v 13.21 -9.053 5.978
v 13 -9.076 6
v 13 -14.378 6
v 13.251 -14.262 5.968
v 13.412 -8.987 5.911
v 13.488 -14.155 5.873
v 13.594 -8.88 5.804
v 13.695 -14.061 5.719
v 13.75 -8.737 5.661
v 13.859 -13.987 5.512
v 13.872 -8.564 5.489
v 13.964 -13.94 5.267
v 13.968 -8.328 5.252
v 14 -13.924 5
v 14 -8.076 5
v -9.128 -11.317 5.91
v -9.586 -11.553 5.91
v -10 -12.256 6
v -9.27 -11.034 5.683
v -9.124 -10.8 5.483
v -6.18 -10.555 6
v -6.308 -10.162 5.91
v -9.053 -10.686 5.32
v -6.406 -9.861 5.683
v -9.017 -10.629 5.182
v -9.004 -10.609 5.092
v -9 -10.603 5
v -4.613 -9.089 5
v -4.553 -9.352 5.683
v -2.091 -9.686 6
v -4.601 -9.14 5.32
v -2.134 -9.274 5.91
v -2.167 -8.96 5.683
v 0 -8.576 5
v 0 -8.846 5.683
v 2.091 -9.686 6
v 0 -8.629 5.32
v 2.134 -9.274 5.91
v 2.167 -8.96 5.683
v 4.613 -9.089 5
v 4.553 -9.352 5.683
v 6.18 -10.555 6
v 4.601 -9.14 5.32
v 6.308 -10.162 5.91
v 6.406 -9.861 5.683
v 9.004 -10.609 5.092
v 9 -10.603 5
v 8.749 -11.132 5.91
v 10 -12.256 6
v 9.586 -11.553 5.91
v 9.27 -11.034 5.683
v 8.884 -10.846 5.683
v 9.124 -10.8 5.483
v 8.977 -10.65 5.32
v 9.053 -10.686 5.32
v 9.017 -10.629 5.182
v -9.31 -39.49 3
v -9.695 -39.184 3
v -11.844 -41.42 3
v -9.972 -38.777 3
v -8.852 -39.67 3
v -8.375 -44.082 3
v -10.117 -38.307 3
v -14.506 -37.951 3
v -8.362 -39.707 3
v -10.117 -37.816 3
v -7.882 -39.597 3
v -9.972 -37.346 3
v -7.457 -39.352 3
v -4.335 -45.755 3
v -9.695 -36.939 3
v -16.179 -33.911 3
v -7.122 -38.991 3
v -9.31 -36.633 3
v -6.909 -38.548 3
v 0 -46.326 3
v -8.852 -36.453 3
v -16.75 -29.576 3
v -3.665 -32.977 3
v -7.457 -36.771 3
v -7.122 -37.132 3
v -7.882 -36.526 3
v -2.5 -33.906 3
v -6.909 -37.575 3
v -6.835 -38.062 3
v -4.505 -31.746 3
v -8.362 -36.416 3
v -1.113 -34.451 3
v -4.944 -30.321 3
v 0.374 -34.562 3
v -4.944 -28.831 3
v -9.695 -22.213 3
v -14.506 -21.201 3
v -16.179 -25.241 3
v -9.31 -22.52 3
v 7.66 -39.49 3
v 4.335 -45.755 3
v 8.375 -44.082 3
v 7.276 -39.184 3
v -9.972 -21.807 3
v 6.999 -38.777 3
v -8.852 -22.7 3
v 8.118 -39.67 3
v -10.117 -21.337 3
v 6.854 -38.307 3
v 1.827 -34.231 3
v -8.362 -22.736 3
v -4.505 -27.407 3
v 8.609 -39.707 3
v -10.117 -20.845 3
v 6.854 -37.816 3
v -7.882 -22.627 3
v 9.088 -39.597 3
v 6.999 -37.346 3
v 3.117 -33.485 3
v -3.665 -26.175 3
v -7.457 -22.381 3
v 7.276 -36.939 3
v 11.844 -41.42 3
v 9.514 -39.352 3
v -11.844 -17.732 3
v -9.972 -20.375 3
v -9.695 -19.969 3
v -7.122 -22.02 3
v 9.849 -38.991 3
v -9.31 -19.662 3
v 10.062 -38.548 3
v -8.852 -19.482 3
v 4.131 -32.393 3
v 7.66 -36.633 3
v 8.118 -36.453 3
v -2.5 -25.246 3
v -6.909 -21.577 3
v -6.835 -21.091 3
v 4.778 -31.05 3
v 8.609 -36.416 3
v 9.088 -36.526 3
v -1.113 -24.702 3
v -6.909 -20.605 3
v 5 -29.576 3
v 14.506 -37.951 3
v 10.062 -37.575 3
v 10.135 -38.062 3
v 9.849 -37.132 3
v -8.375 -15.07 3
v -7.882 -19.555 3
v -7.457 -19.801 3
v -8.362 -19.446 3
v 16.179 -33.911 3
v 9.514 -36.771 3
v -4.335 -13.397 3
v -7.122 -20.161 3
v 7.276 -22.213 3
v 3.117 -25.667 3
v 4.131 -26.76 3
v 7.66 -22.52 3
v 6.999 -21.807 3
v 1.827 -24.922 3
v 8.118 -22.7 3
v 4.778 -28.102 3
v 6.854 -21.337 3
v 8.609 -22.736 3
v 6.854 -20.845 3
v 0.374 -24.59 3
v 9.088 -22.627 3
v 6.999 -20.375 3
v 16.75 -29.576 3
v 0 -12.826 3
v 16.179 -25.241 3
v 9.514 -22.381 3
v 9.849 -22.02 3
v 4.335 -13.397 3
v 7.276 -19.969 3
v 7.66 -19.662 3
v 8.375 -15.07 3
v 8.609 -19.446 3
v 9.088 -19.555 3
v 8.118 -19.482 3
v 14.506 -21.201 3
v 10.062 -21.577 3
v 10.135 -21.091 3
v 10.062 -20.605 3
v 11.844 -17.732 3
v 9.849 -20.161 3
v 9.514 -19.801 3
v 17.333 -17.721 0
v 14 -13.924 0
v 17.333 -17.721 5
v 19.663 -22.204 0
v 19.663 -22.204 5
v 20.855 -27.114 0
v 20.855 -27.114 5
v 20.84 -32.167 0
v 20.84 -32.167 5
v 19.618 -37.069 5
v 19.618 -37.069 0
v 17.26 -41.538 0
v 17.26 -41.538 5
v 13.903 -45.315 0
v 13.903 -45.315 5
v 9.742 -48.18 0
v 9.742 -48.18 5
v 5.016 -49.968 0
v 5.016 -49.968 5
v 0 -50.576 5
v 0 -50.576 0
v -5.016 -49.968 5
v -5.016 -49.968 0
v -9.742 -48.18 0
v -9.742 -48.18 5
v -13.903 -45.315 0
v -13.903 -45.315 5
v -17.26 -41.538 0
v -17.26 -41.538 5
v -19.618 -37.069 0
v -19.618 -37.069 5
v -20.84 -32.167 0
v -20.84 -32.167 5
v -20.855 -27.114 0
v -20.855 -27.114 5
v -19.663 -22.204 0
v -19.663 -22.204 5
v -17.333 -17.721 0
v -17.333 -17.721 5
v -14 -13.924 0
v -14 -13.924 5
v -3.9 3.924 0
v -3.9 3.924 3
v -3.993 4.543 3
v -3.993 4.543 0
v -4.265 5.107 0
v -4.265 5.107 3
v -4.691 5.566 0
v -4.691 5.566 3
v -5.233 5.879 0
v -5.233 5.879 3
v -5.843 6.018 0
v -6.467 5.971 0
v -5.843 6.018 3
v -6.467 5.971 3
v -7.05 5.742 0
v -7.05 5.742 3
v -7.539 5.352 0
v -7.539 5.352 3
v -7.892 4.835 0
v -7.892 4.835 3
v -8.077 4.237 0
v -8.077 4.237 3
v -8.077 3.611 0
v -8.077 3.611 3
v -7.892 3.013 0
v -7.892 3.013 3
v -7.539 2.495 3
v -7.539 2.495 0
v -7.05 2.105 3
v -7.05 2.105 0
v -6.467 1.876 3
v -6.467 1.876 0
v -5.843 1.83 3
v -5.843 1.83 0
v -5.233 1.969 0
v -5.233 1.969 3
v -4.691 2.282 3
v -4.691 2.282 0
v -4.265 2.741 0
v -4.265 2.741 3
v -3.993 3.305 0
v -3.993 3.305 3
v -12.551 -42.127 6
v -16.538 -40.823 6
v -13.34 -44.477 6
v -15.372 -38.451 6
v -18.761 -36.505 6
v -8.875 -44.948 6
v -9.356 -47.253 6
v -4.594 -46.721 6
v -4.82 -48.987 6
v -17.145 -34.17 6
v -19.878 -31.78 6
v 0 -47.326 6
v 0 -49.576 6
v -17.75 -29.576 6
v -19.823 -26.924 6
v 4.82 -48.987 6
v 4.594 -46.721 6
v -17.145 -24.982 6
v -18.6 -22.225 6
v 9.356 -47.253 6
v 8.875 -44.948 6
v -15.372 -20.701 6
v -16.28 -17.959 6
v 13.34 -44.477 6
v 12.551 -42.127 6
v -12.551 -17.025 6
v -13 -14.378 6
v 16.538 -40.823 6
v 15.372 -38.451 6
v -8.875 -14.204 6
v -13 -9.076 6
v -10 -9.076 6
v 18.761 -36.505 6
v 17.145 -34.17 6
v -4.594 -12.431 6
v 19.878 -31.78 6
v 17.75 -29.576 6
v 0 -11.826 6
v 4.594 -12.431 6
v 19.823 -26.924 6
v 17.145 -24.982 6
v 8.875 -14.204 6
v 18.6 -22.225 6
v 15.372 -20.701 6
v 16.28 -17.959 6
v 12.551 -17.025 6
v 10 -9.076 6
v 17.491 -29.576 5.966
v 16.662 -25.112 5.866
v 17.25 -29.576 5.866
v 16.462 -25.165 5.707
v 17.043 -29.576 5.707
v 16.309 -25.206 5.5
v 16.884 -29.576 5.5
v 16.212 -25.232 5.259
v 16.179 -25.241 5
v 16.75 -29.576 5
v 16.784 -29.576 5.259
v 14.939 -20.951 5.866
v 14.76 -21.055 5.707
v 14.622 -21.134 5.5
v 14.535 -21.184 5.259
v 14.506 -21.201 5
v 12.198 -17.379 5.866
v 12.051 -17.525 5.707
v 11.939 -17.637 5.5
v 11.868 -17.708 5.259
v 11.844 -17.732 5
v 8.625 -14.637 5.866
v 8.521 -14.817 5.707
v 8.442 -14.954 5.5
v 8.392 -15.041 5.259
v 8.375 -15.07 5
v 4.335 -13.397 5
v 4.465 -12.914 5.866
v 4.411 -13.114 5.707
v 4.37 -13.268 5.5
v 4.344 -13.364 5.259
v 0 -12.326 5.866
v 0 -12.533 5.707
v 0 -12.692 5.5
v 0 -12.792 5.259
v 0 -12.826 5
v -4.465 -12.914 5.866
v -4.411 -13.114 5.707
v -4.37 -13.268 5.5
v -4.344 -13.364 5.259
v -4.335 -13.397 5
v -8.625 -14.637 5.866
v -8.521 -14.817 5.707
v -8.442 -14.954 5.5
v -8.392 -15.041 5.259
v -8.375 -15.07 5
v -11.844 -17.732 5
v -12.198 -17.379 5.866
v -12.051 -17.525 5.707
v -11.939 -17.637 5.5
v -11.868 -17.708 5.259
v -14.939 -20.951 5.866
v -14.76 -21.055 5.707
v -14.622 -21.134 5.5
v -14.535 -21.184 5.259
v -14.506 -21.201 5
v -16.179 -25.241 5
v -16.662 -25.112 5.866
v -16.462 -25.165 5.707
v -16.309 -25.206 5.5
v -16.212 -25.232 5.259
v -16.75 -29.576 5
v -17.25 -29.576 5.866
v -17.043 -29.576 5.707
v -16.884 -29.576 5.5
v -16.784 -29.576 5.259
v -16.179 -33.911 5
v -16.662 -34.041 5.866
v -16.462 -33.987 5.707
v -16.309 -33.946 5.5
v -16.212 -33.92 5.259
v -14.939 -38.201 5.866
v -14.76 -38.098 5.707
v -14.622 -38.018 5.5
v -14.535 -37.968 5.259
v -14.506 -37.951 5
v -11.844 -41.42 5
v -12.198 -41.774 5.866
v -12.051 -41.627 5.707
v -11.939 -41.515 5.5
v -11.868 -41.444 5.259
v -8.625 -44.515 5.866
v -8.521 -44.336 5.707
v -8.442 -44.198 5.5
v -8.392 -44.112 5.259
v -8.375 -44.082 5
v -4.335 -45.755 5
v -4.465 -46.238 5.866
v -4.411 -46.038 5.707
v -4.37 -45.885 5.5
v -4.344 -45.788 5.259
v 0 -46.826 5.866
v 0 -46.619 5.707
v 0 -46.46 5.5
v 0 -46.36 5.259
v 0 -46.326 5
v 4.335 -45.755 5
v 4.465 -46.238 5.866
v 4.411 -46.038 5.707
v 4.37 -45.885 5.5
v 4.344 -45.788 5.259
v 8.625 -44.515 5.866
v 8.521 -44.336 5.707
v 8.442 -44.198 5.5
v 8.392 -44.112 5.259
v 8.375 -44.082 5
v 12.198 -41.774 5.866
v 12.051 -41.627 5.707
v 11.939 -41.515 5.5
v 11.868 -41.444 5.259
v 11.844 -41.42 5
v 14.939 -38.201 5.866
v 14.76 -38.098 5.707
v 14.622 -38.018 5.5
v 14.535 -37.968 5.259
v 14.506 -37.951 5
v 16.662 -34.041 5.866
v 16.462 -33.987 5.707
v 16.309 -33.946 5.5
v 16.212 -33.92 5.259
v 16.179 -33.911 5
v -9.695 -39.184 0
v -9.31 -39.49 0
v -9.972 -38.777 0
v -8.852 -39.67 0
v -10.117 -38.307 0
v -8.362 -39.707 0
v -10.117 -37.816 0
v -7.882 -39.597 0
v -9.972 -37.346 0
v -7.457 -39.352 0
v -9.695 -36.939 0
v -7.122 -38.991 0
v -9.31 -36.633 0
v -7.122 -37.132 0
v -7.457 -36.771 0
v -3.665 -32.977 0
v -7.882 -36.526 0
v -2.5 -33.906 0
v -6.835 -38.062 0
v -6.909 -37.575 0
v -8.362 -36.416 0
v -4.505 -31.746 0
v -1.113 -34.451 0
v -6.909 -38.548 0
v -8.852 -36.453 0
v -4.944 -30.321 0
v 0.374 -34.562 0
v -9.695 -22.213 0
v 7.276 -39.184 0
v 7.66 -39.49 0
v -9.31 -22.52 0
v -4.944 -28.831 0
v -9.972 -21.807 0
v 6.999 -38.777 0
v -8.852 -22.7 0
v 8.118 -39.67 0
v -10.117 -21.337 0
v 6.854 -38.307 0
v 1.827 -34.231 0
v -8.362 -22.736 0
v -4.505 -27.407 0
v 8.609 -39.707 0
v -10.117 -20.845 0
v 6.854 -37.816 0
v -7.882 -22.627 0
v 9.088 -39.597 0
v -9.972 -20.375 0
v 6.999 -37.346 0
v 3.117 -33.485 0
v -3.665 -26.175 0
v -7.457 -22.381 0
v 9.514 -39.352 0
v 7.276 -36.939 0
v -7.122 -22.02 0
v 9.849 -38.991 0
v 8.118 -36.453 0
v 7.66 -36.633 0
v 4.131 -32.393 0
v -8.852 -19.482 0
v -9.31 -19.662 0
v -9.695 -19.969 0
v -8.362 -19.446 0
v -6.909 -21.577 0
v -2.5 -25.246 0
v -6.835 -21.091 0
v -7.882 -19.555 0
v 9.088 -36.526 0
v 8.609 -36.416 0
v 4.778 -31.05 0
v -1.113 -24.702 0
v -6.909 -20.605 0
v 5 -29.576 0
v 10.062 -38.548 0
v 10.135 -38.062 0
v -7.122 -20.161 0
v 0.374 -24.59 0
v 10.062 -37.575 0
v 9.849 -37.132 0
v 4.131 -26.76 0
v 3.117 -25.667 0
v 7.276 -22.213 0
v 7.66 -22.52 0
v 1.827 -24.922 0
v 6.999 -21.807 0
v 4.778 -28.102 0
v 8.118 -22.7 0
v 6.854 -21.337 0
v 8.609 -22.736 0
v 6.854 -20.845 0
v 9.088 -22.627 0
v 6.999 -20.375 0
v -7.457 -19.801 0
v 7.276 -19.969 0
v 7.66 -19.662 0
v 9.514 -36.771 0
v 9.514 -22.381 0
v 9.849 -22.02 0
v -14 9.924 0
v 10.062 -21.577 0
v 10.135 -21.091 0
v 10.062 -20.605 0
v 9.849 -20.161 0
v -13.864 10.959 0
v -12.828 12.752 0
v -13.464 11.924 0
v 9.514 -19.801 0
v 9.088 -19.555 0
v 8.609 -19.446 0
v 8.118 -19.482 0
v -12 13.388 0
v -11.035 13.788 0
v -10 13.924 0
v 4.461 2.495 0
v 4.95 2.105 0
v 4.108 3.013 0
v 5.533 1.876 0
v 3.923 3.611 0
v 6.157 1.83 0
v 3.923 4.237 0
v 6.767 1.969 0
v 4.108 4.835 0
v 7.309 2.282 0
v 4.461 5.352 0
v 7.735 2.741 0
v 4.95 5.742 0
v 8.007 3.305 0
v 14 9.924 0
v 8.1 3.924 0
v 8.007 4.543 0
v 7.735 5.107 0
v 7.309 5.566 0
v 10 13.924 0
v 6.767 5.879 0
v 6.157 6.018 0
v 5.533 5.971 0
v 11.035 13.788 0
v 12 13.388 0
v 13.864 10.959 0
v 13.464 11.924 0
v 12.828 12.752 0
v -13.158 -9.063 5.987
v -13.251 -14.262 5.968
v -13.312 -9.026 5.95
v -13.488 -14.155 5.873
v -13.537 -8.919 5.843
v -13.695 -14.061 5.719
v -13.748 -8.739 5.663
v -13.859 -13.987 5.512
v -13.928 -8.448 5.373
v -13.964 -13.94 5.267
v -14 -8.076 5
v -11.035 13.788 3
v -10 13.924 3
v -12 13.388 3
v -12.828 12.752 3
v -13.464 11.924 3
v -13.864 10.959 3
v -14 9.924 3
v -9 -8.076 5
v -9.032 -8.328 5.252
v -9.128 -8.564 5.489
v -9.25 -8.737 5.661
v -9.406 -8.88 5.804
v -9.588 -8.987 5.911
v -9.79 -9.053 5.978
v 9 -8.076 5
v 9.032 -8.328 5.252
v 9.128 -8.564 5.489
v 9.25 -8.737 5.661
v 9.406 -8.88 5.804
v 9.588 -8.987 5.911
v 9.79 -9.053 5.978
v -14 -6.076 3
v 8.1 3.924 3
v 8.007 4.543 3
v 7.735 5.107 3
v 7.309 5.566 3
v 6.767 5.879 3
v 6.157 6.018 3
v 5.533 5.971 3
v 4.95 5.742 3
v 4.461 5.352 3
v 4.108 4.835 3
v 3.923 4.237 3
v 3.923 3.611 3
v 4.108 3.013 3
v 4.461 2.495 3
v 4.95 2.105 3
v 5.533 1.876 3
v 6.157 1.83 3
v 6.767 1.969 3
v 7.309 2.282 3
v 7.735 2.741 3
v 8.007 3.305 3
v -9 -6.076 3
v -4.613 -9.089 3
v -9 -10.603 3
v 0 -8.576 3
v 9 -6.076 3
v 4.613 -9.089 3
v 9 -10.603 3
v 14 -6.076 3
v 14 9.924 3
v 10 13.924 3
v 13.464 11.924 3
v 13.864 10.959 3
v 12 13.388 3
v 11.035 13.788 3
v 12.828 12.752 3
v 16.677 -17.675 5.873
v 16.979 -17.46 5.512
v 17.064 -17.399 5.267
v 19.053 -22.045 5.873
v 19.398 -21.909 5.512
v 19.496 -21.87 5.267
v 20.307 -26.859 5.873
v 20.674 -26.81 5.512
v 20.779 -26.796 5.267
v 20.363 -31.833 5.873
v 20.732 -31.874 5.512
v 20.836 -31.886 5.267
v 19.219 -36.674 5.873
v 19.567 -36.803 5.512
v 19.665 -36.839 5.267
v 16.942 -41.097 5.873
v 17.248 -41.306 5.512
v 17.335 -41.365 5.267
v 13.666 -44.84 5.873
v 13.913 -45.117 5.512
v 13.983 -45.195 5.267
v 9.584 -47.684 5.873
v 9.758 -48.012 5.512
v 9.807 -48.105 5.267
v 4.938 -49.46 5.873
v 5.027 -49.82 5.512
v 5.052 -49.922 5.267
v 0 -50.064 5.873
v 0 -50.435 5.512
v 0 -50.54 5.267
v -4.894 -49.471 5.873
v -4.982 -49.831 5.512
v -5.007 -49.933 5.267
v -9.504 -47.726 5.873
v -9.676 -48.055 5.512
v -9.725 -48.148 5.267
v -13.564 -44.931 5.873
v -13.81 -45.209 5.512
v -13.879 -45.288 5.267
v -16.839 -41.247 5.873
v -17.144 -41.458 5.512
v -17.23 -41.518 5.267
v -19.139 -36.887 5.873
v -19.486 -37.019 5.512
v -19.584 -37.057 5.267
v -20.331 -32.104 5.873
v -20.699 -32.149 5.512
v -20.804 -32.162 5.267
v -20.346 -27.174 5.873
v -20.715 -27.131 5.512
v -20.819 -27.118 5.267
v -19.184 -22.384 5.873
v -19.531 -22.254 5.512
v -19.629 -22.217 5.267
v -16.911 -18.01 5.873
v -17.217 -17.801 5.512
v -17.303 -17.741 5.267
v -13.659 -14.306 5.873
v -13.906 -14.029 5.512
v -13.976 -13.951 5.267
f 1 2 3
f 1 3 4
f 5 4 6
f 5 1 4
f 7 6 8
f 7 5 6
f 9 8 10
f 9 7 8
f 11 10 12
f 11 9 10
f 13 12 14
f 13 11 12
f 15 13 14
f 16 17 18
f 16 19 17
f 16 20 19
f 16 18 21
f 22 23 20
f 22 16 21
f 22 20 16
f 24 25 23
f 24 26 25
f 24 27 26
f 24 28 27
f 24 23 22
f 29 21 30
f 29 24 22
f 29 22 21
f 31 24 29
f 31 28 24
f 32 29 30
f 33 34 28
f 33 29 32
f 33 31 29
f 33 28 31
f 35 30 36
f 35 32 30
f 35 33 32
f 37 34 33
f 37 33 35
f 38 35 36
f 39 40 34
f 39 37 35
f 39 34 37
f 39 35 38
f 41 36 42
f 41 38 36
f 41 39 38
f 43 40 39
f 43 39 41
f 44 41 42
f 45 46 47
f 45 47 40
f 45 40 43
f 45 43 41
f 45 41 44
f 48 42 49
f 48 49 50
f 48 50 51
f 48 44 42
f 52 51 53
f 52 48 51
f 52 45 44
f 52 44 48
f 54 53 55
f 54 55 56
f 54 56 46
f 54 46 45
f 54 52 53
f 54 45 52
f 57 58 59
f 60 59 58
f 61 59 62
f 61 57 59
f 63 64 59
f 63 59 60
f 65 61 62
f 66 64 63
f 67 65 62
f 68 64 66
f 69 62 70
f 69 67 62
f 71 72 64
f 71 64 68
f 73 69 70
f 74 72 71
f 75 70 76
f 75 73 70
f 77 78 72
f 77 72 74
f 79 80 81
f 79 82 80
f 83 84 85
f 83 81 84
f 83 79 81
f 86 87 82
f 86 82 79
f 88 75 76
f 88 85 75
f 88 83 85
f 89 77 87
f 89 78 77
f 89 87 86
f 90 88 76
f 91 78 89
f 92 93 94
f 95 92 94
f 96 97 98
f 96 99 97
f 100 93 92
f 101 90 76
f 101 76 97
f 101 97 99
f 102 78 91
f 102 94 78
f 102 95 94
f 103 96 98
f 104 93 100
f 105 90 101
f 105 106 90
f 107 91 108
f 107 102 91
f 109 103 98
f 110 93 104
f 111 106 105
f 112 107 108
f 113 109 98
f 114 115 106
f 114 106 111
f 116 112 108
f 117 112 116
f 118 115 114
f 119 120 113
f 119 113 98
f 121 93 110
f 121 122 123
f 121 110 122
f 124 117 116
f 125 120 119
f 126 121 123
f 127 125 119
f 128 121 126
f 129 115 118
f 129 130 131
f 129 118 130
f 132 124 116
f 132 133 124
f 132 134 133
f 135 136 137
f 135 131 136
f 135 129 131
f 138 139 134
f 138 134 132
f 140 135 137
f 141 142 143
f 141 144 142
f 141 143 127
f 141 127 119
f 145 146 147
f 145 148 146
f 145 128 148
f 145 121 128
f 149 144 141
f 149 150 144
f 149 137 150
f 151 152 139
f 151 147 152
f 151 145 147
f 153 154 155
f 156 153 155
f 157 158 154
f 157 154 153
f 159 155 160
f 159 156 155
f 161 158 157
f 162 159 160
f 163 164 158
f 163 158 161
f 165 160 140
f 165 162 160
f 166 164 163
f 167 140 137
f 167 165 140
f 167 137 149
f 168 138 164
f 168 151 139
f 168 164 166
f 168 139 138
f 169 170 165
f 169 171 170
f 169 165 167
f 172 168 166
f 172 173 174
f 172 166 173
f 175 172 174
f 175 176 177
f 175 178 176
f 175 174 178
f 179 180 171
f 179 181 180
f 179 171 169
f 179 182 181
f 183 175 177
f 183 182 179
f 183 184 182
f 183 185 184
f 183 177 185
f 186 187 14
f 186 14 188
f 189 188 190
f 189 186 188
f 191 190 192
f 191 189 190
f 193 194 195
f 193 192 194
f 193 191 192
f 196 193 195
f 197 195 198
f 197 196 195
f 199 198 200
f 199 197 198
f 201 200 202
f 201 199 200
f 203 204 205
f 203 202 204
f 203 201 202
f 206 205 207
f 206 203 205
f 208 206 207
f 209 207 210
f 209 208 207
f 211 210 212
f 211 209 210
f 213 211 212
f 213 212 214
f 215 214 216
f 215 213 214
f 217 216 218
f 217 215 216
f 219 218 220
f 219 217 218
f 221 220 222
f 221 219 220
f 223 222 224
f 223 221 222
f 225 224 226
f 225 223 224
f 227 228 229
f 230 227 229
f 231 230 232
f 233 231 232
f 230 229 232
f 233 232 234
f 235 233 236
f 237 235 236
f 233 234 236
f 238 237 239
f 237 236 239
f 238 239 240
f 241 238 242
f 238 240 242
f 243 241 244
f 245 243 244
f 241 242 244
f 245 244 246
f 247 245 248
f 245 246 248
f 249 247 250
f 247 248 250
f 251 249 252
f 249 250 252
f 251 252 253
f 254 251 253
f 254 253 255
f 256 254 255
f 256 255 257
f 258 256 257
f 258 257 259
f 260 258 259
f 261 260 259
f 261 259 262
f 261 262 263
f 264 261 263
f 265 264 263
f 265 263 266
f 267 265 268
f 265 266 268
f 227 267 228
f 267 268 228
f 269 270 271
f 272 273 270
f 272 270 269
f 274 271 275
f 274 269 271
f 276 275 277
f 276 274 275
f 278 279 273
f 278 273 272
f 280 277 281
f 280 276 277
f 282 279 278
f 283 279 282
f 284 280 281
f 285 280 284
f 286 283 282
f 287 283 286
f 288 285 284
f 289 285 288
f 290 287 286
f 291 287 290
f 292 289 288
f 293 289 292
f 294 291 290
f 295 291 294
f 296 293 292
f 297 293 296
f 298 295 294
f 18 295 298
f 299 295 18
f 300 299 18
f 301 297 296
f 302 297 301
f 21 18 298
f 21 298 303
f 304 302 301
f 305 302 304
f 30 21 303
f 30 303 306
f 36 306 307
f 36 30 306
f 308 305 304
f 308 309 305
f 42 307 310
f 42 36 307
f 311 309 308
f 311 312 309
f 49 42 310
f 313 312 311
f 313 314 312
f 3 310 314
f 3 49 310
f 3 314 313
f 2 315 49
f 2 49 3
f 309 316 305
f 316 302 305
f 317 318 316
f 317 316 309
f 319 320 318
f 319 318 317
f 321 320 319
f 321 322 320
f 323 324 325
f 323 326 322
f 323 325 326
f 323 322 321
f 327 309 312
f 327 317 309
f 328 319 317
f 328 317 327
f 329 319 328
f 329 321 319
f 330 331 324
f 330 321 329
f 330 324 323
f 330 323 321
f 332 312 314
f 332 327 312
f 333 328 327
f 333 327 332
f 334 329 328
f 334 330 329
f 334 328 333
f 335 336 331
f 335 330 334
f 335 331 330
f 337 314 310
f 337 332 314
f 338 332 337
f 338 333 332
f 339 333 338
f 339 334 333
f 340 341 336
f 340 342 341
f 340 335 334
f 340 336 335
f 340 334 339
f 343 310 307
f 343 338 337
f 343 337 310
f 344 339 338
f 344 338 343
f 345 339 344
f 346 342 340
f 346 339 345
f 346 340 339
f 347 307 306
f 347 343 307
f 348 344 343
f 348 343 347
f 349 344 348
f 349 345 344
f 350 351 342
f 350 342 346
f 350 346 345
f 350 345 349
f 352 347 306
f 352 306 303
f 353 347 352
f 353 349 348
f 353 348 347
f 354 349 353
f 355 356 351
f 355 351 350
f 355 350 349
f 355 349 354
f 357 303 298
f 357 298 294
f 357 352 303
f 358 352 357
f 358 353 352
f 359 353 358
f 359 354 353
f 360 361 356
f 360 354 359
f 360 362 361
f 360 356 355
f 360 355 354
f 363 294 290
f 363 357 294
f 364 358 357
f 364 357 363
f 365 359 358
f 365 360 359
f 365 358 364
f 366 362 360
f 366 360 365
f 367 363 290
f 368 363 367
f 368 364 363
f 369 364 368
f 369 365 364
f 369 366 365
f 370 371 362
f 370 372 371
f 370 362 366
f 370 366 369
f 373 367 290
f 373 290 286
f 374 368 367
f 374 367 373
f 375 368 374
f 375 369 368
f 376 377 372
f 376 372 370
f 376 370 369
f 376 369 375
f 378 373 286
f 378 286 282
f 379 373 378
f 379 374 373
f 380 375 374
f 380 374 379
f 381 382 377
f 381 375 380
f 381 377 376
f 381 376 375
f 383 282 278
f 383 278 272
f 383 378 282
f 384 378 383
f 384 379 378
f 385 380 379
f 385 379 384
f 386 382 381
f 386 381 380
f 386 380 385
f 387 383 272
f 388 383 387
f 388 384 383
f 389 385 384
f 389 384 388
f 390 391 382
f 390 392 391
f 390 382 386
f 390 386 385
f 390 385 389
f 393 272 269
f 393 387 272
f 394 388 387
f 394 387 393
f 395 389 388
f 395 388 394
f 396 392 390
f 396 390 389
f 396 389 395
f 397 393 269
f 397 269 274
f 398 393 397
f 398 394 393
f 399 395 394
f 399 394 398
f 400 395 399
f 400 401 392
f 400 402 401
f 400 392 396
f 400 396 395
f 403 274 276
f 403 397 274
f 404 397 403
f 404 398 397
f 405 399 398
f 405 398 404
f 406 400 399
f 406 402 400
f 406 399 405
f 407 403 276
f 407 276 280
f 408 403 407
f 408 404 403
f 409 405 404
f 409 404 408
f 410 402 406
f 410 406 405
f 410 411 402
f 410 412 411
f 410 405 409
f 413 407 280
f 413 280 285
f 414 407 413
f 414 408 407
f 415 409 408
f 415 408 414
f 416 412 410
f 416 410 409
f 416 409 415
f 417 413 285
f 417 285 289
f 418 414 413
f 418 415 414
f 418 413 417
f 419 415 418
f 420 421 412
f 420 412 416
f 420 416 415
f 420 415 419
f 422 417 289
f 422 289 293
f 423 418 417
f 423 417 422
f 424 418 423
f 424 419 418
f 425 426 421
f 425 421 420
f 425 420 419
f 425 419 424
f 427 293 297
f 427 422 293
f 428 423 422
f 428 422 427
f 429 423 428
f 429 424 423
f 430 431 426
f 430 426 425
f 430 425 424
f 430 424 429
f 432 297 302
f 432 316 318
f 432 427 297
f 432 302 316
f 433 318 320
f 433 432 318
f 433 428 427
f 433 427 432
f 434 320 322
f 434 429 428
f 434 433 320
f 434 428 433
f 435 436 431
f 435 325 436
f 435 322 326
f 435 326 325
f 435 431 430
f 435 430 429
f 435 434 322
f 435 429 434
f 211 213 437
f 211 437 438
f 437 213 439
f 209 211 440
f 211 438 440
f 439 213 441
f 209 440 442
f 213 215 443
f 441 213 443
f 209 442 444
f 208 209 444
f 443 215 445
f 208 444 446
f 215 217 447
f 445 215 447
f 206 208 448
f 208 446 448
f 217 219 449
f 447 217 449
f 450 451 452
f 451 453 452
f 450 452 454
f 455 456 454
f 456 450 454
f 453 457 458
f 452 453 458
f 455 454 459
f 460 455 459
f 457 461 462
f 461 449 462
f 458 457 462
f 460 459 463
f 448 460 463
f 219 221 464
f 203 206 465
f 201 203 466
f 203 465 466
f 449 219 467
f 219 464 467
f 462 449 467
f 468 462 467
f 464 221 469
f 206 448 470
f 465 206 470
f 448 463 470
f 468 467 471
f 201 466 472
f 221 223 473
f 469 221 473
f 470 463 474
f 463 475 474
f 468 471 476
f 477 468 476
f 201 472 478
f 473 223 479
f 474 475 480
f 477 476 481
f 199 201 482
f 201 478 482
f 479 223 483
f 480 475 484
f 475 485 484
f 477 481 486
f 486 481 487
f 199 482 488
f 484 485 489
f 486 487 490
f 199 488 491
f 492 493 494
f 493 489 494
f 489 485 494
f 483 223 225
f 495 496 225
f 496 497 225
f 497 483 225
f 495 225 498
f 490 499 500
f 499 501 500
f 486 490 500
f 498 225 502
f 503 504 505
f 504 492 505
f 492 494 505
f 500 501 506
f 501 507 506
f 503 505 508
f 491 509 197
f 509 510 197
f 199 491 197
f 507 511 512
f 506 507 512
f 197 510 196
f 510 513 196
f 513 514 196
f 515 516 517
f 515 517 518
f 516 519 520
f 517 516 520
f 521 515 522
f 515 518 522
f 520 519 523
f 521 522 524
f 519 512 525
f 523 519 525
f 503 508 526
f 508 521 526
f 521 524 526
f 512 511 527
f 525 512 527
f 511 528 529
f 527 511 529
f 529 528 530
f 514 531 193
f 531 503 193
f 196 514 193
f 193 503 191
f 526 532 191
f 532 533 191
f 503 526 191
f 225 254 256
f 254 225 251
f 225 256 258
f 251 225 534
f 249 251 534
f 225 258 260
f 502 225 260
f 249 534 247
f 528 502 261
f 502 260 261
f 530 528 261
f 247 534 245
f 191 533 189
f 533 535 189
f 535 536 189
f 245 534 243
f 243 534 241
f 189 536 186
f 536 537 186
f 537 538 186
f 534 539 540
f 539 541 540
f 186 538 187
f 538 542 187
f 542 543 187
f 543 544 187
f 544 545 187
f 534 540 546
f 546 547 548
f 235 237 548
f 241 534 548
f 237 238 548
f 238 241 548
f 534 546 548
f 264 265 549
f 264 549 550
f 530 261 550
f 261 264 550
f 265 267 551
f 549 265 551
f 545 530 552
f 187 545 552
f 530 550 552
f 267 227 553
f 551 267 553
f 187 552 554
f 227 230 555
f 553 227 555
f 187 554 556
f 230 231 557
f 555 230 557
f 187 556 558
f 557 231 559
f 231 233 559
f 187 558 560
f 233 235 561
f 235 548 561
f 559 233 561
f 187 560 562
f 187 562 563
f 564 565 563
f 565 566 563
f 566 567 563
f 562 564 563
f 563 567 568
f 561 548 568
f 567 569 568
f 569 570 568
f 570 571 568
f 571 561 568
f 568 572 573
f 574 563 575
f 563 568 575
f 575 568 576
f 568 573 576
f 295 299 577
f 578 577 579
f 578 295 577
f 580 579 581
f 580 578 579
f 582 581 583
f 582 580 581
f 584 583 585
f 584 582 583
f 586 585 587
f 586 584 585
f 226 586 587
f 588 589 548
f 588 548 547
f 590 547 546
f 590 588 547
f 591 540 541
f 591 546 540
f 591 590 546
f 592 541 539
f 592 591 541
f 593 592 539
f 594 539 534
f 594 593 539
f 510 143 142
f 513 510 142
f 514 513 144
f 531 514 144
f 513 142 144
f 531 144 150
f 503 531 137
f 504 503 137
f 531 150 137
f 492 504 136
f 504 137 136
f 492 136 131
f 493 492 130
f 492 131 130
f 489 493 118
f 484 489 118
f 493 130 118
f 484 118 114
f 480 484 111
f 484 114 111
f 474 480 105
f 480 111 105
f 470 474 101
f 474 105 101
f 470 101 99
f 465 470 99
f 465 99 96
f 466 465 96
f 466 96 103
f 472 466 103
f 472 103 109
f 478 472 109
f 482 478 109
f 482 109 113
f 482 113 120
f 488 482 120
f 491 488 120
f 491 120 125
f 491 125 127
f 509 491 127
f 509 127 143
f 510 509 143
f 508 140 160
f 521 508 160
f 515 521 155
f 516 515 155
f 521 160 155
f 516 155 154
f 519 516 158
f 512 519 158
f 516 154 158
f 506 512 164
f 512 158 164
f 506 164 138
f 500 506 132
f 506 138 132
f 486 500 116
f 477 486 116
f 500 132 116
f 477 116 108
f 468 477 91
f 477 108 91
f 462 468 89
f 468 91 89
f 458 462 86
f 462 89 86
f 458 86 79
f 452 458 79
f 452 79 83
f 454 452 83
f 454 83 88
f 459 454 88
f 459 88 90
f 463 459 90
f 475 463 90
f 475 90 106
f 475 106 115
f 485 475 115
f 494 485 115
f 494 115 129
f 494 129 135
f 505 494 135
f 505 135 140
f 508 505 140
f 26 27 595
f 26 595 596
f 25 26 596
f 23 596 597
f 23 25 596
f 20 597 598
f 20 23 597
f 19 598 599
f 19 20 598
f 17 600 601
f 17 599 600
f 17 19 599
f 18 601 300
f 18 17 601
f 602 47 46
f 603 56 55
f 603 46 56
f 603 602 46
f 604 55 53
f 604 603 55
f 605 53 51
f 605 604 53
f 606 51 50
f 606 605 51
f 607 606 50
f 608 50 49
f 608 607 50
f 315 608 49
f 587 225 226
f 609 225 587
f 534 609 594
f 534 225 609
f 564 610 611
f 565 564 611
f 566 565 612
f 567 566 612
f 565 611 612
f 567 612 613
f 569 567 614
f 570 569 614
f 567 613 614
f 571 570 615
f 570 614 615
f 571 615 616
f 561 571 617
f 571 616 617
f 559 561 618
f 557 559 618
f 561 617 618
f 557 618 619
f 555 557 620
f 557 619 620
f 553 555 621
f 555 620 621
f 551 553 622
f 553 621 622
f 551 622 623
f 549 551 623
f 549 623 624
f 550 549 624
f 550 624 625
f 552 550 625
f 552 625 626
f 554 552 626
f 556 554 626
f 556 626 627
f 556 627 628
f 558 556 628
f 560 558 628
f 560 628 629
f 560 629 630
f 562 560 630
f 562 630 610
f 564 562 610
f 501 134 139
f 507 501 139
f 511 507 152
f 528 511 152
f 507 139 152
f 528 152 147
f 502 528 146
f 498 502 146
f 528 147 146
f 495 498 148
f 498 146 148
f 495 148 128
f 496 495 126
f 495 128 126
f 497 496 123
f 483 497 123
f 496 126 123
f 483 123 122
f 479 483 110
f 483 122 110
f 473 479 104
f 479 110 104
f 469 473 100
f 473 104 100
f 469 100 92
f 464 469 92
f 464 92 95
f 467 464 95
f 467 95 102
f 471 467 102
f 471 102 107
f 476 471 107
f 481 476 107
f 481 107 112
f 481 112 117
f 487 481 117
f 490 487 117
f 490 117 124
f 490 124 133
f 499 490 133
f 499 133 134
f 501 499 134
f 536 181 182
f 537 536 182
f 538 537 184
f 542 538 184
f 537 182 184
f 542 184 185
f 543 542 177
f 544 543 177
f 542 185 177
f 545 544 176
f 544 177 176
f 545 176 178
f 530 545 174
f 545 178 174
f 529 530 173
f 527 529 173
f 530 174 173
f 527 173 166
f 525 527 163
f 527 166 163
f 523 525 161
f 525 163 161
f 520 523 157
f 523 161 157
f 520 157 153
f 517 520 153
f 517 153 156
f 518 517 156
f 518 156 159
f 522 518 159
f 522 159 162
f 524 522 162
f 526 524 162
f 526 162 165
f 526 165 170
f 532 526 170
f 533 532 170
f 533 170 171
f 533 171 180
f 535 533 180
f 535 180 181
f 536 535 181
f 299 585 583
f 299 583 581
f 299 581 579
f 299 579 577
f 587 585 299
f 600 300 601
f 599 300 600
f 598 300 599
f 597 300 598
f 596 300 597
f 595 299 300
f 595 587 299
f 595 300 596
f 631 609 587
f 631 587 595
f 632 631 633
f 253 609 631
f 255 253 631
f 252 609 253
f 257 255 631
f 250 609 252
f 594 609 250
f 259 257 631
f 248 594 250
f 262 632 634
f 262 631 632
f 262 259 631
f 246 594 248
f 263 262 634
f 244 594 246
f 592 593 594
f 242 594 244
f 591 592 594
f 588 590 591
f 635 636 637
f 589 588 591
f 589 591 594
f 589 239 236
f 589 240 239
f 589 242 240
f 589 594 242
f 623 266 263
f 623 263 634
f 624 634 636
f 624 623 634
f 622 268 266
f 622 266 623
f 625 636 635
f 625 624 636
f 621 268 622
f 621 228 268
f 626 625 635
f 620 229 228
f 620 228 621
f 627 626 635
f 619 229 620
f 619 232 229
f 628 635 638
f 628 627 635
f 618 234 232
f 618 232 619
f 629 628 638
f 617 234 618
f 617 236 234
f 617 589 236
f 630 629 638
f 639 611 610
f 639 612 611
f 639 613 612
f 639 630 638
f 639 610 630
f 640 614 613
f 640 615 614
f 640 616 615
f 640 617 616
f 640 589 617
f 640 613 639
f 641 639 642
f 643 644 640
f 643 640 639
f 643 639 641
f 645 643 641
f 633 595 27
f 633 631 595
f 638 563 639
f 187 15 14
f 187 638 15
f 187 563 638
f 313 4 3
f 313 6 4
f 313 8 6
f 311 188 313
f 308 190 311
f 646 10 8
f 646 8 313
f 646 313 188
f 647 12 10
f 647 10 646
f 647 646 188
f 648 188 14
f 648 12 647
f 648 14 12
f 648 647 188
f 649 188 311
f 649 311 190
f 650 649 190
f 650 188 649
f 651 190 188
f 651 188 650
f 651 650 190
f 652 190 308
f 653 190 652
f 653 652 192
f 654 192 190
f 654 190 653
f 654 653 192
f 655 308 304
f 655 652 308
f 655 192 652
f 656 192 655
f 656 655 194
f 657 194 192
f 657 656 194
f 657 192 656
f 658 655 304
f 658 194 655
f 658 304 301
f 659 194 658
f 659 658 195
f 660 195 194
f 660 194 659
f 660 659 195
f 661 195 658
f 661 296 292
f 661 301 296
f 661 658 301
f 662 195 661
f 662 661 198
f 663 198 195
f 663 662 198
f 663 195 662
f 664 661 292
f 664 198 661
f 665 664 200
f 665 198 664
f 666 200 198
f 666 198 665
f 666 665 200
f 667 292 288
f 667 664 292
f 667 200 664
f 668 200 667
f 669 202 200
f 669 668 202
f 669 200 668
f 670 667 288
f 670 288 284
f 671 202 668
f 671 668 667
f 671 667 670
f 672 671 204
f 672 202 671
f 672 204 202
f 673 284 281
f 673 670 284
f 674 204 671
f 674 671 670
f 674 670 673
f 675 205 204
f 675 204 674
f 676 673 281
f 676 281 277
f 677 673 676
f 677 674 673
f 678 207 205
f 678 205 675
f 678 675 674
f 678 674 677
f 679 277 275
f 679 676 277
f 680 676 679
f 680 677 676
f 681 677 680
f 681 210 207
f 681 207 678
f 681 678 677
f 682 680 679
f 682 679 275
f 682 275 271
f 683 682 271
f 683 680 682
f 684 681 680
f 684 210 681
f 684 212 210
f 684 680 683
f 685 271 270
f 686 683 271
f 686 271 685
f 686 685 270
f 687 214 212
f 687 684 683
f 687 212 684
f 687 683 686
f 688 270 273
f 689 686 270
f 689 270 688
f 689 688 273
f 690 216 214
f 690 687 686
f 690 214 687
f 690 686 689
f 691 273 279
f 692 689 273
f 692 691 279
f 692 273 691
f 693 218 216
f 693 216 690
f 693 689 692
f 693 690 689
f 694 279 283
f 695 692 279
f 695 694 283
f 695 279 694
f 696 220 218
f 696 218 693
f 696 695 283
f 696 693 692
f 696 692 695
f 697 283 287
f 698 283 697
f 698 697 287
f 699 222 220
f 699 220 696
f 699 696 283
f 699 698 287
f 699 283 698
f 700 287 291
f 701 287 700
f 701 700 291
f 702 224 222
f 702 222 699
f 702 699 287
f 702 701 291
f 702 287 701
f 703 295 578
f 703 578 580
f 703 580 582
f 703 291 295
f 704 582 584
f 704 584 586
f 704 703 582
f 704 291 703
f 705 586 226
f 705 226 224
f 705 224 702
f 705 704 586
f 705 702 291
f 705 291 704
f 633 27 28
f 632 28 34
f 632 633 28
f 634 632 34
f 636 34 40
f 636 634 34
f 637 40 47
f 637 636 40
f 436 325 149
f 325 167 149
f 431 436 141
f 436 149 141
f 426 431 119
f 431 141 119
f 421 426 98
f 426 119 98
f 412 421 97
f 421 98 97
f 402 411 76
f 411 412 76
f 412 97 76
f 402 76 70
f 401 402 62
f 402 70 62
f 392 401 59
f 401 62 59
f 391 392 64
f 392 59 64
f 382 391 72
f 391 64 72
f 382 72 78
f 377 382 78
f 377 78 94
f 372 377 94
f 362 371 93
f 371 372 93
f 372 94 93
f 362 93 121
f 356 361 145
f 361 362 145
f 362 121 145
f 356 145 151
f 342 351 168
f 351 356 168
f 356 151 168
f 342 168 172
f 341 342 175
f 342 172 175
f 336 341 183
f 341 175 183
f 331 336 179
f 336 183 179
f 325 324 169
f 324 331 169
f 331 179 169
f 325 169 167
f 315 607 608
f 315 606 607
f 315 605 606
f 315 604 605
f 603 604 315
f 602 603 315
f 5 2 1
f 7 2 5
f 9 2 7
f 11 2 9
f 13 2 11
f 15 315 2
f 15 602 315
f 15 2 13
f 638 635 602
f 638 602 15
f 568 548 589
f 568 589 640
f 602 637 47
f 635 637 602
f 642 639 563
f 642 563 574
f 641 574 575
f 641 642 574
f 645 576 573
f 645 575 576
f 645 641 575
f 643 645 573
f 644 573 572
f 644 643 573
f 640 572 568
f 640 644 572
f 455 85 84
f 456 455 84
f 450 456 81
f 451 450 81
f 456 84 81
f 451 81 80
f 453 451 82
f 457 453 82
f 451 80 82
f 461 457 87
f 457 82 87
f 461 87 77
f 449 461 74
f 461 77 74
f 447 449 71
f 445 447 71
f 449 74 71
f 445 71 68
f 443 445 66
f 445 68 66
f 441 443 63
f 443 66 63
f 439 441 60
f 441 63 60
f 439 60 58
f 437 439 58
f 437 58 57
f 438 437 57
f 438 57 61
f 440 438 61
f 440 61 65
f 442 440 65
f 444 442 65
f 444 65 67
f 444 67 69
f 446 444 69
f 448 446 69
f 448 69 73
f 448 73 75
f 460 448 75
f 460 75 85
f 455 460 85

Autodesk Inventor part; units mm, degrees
ref_plane "YZ Plane" through (0, 0, 0) normal (1, 0, 0) x (0, 1, 0)
ref_plane "XZ Plane" through (0, 0, 0) normal (0, 1, 0) x (-1, 0, 0)
ref_plane "XY Plane" through (0, 0, 0) normal (0, 0, 1) x (1, 0, 0)
sketch "Sketch1" plane through (0, 0, 0) normal (0, 0, 1) x (1, 0, 0)
  line L0 (-14, 13.9238) -> (14, 13.9238)
  line L1 (14, 13.9238) -> (14, -13.9238)
  line L2 (14, -29.5762) -> (-14, -29.5762)
  line L3 (-14, -29.5762) -> (-14, -13.9238)
  arc A0 (-14, -13.9238) -> (14, -13.9238) centre (0, -29.5762) ccw
  line L4 (-14, -13.9238) -> (-14, 13.9238)
  line L5 (14, -13.9238) -> (14, -29.5762)
  point P0 (0, 0)
  point P1 (0, 13.9238)
  point P2 (14, 0)
  dimension "d0" = 42
  dimension "d1" = 43.5
  dimension "d4" = 28
extrude "Extrusion1" add sketch "Sketch1" along normal blind 3
sketch "Sketch2" plane through (0, 0, 3) normal (0, 0, 1) x (1, 0, 0)
  line L0 (14, -13.9238) -> (14, 13.9238) projected
  line L1 (14, 13.9238) -> (-14, 13.9238) construction
  line L2 (-14, 13.9238) -> (-14, -13.9238) construction
  arc A0 (-14, -13.9238) -> (14, -13.9238) centre (0, -29.5762) ccw projected
  circle A1 centre (0, -29.5762) radius 16.75
  circle A2 centre (0, -29.5762) radius 21
  line L3 (-14, -6.0762) -> (14, -6.0762)
  line L4 (14, -13.9238) -> (14, 13.9238) construction
  line L5 (-14, 13.9238) -> (-14, -13.9238) projected
  line L6 (-14, -6.0762) -> (-14, -13.9238)
  line L7 (-9, -6.0762) -> (-9, -10.6026)
  line L8 (14, -6.0762) -> (14, -13.9238)
  line L9 (9, -10.6026) -> (9, -6.0762)
  arc A3 (-14, -13.9238) -> (14, -13.9238) centre (0, -29.5762) ccw projected
  line L10 (14, -6.0762) -> (14, -13.9238)
  point P0 (0, 0)
  dimension "d5" = 33.5
  dimension "d6" = 20
  dimension "d7" = 5
  dimension "d8" = 5
extrude "Extrusion2" add sketch "Sketch2" along normal blind 3 contours A2 L9 L3 L0 | A0 A2 | L5 L3 L7 A2
sketch "Sketch3" plane through (0, 0, 3) normal (0, 0, 1) x (1, 0, 0)
  circle A0 centre (0, -29.5762) radius 16.75 projected
  circle A1 centre (0, -29.5762) radius 5
  line L0 (9, -6.0762) -> (14, -6.0762) projected
  line L1 (14, -6.0762) -> (14, 13.9238) projected
  line L2 (14, 13.9238) -> (-14, 13.9238) projected
  line L3 (-14, 13.9238) -> (-14, -6.0762) projected
  line L4 (-14, -6.0762) -> (-9, -6.0762) projected
  line L5 (-9, -6.0762) -> (-9, -10.6026) projected
  arc A2 (9, -10.6026) -> (-9, -10.6026) centre (0, -29.5762) ccw projected
  line L6 (9, -10.6026) -> (9, -6.0762) projected
  circle A3 centre (-6, 3.9238) radius 2.1
  circle A4 centre (6, 3.9238) radius 2.1
  line L7 (-6, 3.9238) -> (6, 3.9238) construction
  point P0 (0, 0)
  point P1 (0, 3.9238)
  dimension "d11" = 10
  dimension "d12" = 4.2
  dimension "d13" = 12
  dimension "d14" = 10
extrude "Extrusion3" cut sketch "Sketch3" against normal up to next contours A1 | A3 | A4
chamfer "Chamfer1" distance 3 angle 45 2 edges at (11.5, -6.0762, 6) (-11.5, -6.0762, 6)
fillet "Fillet1" radius 1 7 edges at (-16.75, -29.5762, 6) (0, -8.5762, 6) (0, -50.5762, 6) (-14, -11.4998, 6) (-9, -9.8392, 6) (9, -9.8392, 6) (14, -11.4998, 6)
sketch "Sketch4" plane through (0, -29.5762, 3) normal (0, 0, 1) x (1, 0, 0)
  circle A0 centre (0, 0) radius 5 projected
  circle A1 centre (8.4853, 8.4853) radius 1.65
  line L0 (0, 0) -> (8.4853, 8.4853) construction
  line L1 (0, 0) -> (0, 12.1192) construction
  line L2 (0, 0) -> (-12.1192, 0) construction
  circle A2 centre (-8.4853, 8.4853) radius 1.65
  line L3 (0, 0) -> (0, -12.1192) construction
  circle A3 centre (-8.4853, -8.4853) radius 1.65
  line L4 (0, 0) -> (12.1192, 0) construction
  circle A4 centre (8.4853, -8.4853) radius 1.65
  point P0 (0, 29.5762)
  dimension "d21" = 45
  dimension "d22" = 3.3
  dimension "d23" = 12
  dimension "d26" = 360
extrude "Extrusion4" cut sketch "Sketch4" against normal up to next contours A1 | A2 | A3 | A4
fillet "Fillet2" radius 4 2 edges at (-14, 13.9238, 1.5) (14, 13.9238, 1.5)
equation "\"d8\" = d7"
properties part number "holder-LMF8LUU-z-axis"
